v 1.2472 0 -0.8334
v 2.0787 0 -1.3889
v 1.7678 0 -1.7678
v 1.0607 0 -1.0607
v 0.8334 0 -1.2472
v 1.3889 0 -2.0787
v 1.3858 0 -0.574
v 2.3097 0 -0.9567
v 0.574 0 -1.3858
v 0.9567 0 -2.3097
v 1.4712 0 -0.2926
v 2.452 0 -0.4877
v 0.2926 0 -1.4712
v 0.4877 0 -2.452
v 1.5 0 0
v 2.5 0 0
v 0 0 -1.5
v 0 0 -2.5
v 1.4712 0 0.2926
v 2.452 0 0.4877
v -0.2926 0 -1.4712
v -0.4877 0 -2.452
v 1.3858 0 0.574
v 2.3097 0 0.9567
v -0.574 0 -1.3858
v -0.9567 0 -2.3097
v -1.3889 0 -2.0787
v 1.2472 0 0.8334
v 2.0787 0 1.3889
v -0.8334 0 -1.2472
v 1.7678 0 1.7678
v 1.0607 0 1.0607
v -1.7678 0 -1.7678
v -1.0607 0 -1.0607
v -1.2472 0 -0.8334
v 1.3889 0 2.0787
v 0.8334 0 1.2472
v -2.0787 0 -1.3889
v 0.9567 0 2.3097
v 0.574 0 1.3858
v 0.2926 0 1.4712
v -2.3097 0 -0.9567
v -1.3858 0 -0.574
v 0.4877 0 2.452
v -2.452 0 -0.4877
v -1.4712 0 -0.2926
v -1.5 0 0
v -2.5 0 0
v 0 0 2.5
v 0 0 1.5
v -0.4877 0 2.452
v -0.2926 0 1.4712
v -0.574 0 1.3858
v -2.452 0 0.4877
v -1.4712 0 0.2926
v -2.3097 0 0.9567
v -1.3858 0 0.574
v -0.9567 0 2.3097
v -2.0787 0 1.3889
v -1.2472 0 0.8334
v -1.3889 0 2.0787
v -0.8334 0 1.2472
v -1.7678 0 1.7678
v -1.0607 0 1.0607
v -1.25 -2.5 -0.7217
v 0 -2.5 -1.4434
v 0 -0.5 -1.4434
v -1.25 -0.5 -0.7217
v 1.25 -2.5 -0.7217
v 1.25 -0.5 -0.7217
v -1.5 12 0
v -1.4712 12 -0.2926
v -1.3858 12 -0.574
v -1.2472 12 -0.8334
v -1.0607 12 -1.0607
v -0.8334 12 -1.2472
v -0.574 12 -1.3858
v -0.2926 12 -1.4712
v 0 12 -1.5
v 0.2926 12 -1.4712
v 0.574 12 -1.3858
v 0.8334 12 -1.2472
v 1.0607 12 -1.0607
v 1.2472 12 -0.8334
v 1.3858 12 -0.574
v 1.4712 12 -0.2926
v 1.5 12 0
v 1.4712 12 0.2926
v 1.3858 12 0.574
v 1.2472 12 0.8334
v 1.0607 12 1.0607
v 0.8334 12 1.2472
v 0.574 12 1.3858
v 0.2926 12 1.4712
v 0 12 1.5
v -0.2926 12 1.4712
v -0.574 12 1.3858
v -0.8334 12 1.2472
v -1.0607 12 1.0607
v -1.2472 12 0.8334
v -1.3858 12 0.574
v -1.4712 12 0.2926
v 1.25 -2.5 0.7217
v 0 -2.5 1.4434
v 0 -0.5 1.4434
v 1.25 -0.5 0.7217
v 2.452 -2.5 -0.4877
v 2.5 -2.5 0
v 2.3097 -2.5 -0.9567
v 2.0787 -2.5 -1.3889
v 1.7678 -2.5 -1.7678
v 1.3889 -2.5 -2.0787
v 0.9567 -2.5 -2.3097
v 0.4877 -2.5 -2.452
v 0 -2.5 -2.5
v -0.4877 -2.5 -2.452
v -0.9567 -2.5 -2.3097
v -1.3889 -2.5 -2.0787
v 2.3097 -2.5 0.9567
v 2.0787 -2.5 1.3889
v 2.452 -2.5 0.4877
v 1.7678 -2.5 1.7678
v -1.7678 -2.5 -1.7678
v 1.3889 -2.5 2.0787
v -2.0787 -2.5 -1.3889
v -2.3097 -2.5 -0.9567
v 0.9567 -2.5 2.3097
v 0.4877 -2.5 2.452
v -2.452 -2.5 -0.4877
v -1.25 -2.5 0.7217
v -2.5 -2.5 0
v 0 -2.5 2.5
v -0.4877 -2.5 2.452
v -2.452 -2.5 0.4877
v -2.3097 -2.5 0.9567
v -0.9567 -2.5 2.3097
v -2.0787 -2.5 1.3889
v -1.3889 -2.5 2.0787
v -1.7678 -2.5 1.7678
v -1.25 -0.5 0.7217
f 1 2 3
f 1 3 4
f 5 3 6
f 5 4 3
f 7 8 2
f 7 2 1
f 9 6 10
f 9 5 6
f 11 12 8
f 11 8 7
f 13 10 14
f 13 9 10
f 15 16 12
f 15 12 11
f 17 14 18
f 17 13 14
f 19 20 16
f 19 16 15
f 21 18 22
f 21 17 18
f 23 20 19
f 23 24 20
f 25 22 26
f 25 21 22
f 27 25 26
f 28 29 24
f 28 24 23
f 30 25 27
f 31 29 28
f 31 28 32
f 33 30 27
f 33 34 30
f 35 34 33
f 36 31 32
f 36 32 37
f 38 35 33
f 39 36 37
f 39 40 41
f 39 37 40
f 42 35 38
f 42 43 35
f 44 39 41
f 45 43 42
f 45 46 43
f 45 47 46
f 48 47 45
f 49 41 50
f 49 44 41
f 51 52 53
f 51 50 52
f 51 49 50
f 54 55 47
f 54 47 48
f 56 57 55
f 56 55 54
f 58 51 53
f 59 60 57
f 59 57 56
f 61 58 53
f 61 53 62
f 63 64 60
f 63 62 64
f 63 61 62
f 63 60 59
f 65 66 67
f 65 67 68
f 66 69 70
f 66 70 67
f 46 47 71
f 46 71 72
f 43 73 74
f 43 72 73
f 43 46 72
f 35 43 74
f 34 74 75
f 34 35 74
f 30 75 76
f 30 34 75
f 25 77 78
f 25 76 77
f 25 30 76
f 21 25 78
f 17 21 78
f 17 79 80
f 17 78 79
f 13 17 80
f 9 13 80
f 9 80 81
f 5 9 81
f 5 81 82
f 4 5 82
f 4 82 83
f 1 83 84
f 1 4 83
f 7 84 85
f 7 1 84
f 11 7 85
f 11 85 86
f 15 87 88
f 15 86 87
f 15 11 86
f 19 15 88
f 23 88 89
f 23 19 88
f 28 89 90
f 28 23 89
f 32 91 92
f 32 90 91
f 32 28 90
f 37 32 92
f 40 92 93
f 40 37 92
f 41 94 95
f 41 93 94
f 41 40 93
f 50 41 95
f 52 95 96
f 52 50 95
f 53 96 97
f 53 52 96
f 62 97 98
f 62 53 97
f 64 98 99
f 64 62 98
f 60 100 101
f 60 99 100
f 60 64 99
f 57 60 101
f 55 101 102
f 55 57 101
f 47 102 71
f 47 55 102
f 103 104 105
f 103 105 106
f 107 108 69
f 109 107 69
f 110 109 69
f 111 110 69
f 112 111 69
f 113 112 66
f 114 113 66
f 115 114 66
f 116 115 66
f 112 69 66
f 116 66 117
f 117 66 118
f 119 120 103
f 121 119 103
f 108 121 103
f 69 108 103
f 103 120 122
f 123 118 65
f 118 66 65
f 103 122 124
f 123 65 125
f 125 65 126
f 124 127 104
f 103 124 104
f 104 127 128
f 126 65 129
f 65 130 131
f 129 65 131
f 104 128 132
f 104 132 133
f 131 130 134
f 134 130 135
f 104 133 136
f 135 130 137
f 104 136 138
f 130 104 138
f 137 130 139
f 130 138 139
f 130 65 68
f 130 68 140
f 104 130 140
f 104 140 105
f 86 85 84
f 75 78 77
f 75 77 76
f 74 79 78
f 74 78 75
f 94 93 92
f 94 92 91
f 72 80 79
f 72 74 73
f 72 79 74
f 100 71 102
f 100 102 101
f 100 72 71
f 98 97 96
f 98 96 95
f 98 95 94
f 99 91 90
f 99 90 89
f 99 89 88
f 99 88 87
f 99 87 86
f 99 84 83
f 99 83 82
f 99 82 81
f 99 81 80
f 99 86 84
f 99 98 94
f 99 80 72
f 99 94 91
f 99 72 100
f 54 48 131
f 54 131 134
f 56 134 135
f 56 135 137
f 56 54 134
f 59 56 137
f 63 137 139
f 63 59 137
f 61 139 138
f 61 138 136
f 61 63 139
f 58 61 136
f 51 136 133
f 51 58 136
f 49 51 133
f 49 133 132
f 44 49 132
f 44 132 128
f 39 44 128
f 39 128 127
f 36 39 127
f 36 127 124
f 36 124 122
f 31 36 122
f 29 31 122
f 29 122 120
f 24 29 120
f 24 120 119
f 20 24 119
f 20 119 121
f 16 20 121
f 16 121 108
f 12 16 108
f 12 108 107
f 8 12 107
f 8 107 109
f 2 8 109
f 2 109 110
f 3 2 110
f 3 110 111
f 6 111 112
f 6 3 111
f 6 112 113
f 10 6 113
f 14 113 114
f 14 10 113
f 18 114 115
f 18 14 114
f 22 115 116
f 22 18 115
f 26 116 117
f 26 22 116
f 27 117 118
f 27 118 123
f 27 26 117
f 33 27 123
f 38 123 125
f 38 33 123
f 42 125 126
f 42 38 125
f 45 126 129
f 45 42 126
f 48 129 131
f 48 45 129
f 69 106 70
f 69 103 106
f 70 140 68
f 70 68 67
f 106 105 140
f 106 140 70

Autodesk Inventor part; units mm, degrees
ref_plane "YZ Plane" through (0, 0, 0) normal (1, 0, 0) x (0, 1, 0)
ref_plane "XZ Plane" through (0, 0, 0) normal (0, 1, 0) x (-1, 0, 0)
ref_plane "XY Plane" through (0, 0, 0) normal (0, 0, 1) x (1, 0, 0)
sketch "Sketch1" plane through (0, 0, 0) normal (0, 1, 0) x (-1, 0, 0)
  circle A0 centre (0, 0) radius 1.5
  circle A1 centre (0, 0) radius 2.5
  dimension "d0" = 3
  dimension "d1" = 5
extrude "Extrusion1" add sketch "Sketch1" along normal blind 12 contours A0
extrude "Extrusion2" add sketch "Sketch1" against normal blind 2.5 contours A0 | A1
thread "Thread1" size "M3x0.35" class "6g" standard "ANSI Metric M Profile" full length
sketch "Sketch2" plane through (0, -2.5, 0) normal (0, -1, 0) x (1, 0, 0)
  line L0 (1.25, -0.7217) -> (0, -1.4434)
  line L1 (0, -1.4434) -> (-1.25, -0.7217)
  line L2 (-1.25, -0.7217) -> (-1.25, 0.7217)
  line L3 (-1.25, 0.7217) -> (0, 1.4434)
  line L4 (0, 1.4434) -> (1.25, 0.7217)
  line L5 (1.25, 0.7217) -> (1.25, -0.7217)
  point P0 (0, 0)
  point P1 (0, 0)
  point P2 (1.25, 0)
extrude "Extrusion3" cut sketch "Sketch2" against normal blind 2
properties part number "M4"
